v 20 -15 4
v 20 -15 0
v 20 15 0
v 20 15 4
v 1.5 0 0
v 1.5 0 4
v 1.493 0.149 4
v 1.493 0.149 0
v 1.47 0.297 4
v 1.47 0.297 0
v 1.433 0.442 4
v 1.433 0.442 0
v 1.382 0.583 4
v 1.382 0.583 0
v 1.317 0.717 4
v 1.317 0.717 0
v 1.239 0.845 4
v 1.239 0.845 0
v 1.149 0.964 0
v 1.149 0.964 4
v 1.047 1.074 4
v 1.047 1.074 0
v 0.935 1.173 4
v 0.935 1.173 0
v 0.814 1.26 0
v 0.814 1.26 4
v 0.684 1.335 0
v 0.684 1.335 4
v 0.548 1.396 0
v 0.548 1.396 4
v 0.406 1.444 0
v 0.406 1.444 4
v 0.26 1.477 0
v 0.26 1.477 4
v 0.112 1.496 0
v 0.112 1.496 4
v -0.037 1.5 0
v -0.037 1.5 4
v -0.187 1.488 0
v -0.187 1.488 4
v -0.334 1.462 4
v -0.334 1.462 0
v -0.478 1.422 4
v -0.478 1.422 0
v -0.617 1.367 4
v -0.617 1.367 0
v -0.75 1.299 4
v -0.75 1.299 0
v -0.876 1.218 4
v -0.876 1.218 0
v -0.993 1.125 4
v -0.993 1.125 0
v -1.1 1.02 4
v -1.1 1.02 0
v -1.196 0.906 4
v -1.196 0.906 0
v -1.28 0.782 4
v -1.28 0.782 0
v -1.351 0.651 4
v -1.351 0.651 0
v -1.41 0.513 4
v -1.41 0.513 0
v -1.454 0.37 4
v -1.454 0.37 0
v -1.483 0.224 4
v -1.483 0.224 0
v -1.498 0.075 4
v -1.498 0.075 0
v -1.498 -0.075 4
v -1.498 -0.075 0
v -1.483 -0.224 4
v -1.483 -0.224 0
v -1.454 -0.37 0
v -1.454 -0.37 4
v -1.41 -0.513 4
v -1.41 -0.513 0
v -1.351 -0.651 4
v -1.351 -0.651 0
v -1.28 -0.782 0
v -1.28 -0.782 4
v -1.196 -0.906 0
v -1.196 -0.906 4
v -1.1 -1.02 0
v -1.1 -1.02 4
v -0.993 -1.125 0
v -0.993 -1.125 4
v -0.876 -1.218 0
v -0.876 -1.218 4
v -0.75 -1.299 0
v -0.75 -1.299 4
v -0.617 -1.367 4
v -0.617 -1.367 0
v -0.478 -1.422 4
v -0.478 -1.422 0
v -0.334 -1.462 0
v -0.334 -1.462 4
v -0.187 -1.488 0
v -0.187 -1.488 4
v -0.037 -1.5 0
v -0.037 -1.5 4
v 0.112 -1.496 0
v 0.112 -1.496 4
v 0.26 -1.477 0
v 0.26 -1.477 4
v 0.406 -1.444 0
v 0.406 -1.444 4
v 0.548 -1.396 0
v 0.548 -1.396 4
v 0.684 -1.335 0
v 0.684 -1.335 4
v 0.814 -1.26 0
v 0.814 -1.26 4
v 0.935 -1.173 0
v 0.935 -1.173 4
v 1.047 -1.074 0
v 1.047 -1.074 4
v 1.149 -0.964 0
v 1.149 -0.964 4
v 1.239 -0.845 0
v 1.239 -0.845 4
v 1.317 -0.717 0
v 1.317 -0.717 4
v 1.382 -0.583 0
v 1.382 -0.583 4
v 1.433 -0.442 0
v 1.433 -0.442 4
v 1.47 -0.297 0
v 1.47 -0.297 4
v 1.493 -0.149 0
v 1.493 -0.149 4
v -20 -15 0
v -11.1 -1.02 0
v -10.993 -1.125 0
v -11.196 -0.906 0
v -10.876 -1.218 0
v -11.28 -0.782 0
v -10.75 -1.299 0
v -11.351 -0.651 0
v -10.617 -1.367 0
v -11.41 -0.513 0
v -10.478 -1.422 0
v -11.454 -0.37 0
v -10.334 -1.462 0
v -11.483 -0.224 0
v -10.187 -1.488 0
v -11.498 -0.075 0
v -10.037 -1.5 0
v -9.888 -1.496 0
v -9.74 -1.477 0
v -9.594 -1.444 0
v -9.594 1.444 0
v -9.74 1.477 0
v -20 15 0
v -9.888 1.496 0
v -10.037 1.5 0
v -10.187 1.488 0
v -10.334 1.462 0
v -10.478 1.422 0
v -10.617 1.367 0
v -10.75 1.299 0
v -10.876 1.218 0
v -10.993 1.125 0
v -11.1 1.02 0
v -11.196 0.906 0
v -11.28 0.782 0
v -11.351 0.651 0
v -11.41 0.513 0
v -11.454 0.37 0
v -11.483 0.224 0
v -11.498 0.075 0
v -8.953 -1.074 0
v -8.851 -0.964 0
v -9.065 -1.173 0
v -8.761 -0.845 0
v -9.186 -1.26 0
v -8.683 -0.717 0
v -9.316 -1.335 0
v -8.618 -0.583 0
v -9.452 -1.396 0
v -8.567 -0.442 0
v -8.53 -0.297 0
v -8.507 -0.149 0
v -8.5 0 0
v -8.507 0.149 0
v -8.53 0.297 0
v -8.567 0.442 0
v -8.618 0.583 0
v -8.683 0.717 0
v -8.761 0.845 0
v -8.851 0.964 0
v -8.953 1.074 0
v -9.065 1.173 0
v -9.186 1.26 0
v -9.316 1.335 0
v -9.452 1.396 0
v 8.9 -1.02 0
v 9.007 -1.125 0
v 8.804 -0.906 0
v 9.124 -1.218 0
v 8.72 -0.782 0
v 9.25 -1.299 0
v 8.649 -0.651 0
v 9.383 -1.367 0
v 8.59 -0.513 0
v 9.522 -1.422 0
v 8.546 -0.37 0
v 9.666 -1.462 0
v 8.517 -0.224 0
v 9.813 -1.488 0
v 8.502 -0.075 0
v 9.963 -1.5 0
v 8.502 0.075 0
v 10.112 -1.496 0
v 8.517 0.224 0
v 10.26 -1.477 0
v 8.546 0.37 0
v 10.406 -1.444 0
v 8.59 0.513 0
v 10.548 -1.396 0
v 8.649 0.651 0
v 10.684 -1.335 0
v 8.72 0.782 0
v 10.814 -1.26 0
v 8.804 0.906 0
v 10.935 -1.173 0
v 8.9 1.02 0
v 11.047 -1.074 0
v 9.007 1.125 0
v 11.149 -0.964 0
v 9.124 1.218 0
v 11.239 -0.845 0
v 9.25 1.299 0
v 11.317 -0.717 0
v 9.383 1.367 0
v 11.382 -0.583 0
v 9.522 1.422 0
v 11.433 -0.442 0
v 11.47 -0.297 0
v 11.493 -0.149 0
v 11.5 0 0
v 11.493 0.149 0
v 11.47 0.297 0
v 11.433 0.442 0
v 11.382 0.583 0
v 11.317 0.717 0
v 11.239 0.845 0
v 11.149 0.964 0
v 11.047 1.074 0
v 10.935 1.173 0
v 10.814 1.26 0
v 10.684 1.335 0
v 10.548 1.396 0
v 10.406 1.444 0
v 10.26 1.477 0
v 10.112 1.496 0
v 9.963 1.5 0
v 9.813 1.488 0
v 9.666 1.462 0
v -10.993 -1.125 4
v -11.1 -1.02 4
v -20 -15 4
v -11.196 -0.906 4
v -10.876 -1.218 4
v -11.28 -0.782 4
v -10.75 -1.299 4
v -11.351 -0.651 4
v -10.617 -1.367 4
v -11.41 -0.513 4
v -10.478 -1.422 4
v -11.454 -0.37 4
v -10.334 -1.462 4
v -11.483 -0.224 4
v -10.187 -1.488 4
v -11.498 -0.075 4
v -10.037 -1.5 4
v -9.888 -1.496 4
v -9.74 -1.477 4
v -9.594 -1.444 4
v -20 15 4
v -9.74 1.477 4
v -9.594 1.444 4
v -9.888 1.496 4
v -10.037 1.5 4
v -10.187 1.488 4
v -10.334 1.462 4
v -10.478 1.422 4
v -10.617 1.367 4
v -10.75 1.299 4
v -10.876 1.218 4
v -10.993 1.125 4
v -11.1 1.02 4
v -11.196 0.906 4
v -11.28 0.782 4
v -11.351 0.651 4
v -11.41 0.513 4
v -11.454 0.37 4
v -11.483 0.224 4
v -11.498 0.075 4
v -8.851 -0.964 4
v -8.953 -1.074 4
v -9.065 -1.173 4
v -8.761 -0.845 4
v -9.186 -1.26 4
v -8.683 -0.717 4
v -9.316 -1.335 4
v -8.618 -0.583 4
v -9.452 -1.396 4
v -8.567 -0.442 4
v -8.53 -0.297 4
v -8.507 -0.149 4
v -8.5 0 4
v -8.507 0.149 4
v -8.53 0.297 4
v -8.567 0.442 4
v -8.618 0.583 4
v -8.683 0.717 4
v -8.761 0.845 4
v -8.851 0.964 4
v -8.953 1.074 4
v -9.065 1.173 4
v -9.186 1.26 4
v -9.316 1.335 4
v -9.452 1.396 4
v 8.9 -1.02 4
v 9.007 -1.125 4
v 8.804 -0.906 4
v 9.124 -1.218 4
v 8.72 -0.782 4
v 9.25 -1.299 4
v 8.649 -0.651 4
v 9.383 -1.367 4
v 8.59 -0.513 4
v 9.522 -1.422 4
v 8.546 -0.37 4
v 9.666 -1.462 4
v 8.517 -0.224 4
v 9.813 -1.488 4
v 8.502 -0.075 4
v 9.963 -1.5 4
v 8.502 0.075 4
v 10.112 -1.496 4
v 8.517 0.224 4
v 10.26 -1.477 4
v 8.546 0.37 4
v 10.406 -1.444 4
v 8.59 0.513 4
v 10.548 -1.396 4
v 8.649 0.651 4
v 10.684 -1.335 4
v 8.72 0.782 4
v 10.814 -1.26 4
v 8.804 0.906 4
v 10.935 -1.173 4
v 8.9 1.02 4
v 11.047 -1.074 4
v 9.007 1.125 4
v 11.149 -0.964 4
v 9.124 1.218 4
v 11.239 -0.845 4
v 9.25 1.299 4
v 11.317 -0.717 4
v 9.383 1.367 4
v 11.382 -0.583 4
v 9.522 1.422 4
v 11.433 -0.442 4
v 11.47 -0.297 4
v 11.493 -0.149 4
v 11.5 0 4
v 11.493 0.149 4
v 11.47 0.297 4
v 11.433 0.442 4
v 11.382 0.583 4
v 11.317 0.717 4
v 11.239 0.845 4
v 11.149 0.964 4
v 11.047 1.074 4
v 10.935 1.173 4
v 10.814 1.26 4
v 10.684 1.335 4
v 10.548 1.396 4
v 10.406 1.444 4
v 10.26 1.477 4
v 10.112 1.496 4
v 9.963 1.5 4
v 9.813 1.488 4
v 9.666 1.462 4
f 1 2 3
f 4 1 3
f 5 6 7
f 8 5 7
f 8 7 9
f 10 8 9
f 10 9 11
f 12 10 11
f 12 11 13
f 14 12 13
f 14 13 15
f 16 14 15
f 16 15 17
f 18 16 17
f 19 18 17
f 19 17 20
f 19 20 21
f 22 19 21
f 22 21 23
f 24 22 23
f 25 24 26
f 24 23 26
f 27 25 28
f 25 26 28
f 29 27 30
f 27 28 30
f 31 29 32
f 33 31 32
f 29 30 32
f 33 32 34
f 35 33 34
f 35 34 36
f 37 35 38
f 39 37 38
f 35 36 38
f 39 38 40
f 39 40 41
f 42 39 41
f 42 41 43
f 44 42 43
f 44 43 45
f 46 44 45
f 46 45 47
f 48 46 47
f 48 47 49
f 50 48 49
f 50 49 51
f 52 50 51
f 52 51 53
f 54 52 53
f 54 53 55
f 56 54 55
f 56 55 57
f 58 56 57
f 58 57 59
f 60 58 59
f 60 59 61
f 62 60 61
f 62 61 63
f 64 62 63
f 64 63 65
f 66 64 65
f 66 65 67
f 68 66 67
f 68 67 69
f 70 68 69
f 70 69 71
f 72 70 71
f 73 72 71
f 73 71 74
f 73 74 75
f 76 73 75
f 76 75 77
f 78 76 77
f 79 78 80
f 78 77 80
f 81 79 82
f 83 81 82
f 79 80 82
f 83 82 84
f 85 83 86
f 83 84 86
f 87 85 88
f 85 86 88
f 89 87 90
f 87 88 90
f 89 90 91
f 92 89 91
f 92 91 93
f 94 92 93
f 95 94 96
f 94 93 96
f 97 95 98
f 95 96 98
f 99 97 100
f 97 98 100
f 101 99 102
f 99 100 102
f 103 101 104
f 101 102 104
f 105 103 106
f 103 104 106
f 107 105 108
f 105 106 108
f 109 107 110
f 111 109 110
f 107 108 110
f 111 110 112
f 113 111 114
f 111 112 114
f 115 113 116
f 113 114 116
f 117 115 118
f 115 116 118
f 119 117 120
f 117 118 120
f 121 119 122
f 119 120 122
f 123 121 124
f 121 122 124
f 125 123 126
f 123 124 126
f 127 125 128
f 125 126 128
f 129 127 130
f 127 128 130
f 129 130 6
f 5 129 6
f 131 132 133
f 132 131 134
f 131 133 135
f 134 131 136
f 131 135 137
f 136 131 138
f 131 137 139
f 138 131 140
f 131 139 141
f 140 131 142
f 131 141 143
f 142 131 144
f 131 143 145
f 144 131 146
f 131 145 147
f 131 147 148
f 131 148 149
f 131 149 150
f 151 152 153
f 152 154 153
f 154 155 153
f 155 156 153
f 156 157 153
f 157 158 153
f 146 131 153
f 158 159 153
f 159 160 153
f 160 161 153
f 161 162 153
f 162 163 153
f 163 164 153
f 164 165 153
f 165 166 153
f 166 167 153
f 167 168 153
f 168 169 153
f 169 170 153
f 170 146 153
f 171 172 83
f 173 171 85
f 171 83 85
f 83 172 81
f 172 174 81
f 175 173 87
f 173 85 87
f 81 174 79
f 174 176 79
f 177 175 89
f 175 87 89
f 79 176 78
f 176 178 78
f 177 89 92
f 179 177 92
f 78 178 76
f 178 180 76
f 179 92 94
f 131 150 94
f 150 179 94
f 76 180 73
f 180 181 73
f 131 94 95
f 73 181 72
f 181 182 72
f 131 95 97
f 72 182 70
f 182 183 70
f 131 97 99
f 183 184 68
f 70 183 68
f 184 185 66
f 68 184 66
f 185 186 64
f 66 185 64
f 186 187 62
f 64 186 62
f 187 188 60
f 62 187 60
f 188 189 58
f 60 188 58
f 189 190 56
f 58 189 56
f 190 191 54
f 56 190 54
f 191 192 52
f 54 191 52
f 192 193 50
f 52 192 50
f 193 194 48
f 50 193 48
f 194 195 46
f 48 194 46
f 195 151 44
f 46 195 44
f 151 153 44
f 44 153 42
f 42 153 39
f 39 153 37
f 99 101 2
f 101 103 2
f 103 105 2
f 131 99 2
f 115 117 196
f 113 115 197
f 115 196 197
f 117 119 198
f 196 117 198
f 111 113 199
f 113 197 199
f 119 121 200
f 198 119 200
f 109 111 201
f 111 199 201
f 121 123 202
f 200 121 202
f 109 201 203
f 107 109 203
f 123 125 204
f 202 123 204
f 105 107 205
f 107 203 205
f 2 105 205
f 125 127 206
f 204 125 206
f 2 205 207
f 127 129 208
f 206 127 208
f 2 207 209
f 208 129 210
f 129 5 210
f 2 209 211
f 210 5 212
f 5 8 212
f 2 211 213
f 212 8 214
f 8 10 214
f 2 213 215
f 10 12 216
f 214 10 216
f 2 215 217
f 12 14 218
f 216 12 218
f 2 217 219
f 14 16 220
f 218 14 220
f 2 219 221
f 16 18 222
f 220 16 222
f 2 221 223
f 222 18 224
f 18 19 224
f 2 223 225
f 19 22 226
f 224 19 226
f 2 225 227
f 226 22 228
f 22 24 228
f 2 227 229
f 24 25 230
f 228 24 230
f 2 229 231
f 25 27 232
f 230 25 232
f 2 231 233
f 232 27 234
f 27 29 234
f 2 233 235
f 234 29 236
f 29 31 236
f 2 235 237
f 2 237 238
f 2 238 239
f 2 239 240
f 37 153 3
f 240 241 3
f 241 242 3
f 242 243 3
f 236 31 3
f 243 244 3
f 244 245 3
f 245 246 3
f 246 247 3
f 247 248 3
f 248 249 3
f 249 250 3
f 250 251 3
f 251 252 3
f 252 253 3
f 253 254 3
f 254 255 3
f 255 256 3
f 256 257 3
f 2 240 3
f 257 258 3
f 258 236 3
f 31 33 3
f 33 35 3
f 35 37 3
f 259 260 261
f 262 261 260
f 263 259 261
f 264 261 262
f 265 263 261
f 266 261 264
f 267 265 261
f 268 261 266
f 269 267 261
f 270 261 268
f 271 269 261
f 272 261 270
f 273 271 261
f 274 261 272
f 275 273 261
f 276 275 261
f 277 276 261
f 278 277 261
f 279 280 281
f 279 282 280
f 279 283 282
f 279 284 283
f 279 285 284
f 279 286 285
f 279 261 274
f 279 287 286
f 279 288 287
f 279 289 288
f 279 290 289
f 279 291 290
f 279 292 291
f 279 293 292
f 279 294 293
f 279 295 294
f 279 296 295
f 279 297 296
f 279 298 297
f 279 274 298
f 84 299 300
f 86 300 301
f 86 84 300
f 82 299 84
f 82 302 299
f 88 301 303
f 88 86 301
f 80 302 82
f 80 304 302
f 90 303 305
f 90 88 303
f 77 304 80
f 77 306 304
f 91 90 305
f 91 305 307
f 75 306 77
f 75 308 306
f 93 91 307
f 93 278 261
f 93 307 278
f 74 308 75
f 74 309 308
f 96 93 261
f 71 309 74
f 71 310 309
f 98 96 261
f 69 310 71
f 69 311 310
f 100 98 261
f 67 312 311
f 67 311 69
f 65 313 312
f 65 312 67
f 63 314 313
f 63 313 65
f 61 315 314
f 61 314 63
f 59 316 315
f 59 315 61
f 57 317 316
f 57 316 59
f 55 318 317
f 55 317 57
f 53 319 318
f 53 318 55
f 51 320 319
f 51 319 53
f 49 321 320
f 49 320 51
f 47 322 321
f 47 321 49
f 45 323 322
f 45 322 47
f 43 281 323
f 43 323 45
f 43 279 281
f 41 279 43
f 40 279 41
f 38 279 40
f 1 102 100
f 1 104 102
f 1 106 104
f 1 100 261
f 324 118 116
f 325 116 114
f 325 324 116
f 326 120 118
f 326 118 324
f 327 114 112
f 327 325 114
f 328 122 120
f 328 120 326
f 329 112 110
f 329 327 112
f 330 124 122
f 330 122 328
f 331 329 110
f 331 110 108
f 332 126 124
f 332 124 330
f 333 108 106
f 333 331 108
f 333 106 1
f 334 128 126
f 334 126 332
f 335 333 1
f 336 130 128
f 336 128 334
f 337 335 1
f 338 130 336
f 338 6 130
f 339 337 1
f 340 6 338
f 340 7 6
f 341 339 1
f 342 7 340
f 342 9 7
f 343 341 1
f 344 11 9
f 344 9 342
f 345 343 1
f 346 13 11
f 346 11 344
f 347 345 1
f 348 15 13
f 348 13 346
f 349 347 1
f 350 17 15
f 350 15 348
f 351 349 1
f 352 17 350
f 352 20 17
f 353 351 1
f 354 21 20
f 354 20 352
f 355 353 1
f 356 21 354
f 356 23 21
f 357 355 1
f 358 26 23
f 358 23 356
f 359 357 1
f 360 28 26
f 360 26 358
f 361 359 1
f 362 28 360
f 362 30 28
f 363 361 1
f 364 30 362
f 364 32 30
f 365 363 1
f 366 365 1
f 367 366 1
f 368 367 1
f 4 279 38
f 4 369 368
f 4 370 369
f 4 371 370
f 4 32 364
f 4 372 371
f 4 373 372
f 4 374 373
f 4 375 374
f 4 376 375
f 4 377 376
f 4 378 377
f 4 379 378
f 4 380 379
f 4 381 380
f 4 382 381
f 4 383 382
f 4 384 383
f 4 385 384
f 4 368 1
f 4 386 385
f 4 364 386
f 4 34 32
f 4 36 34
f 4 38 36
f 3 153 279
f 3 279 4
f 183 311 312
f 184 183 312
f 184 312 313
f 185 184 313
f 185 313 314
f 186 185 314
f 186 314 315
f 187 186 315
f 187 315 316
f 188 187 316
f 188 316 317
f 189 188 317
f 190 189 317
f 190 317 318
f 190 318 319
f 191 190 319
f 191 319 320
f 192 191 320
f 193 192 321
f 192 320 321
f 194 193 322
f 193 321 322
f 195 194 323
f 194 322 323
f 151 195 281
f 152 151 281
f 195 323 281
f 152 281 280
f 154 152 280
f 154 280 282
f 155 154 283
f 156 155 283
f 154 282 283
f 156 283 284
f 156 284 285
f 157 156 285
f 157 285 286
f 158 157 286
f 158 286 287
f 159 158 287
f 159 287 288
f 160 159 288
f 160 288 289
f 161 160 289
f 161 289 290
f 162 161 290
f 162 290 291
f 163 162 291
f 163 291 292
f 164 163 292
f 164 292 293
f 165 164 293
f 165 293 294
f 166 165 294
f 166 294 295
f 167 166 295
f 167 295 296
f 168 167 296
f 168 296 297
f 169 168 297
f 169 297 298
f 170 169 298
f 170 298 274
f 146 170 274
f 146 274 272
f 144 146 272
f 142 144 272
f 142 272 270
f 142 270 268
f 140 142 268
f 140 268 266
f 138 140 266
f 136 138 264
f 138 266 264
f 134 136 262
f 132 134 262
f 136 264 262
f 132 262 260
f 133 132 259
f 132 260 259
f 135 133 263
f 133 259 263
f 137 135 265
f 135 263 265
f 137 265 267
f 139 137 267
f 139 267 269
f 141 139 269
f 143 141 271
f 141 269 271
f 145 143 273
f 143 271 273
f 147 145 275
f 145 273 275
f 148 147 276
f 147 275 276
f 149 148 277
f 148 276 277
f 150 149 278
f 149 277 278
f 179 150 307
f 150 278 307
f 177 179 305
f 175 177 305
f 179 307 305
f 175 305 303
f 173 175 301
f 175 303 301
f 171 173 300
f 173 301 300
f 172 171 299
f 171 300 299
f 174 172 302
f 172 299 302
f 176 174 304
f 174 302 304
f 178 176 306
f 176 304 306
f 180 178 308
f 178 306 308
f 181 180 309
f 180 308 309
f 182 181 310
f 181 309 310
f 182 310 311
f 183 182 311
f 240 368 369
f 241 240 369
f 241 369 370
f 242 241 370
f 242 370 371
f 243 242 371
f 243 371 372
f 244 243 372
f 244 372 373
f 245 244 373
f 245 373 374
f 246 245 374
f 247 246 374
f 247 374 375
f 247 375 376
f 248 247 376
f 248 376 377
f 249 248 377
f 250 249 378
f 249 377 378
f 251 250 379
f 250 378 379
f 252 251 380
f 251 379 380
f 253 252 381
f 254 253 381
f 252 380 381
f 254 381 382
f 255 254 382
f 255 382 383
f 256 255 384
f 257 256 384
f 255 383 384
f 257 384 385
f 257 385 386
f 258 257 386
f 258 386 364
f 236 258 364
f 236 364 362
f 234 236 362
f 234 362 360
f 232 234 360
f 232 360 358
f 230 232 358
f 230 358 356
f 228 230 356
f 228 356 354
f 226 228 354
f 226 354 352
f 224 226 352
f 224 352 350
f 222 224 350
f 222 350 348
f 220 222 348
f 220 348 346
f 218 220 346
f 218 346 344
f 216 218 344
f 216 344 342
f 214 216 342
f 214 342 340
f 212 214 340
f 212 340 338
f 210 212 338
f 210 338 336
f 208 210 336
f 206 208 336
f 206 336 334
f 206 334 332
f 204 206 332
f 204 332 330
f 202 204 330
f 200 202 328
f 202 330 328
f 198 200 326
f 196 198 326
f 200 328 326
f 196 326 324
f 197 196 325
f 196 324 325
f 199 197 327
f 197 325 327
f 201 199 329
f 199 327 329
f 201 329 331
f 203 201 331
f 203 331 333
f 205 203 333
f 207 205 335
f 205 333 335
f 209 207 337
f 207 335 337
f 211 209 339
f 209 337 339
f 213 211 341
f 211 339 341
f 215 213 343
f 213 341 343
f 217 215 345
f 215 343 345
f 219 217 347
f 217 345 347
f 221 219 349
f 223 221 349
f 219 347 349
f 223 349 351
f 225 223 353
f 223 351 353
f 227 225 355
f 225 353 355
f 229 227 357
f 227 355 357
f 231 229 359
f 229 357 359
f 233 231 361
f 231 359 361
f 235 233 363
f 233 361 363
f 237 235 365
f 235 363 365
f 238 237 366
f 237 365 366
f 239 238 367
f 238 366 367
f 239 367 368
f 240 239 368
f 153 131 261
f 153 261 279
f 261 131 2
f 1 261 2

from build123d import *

# Parameters (mm, degrees)
ESBO_O1_W                = 40
ESBO_O1_H                = 30
RESSALTO_EXTRUS_O1_DEPTH = 4
CORTE_EXTRUS_O1_REACH    = 27.318
ESBO_O2_R                = 1.5


with BuildPart() as part:
    # Esboço1 → Ressalto-extrusão1 (new body)
    with BuildSketch(Plane.XY):
        Rectangle(ESBO_O1_W, ESBO_O1_H)
    extrude(amount=RESSALTO_EXTRUS_O1_DEPTH)

    # Esboço2 → Corte-extrusão1 (cut, up to next)
    with BuildSketch(Plane.XY.offset(4), mode=Mode.PRIVATE) as corte_extrus_o1_sk1:
        Circle(ESBO_O2_R)
    corte_extrus_o1_tool1 = extrude(corte_extrus_o1_sk1.sketch, amount=-CORTE_EXTRUS_O1_REACH, mode=Mode.PRIVATE) & part.part
    # Esboço2 → Corte-extrusão1 (cut, up to next)
    with BuildSketch(Plane.XY.offset(4), mode=Mode.PRIVATE) as corte_extrus_o1_sk2:
        with Locations((-10, 0)):
            Circle(ESBO_O2_R)
    corte_extrus_o1_tool2 = extrude(corte_extrus_o1_sk2.sketch, amount=-CORTE_EXTRUS_O1_REACH, mode=Mode.PRIVATE) & part.part
    # Esboço2 → Corte-extrusão1 (cut, up to next)
    with BuildSketch(Plane.XY.offset(4), mode=Mode.PRIVATE) as corte_extrus_o1_sk3:
        with Locations((10, 0)):
            Circle(ESBO_O2_R)
    corte_extrus_o1_tool3 = extrude(corte_extrus_o1_sk3.sketch, amount=-CORTE_EXTRUS_O1_REACH, mode=Mode.PRIVATE) & part.part
    add(corte_extrus_o1_tool1.solids().sort_by_distance((0, 0, 4))[0], mode=Mode.SUBTRACT)
    add(corte_extrus_o1_tool2.solids().sort_by_distance((-10, 0, 4))[0], mode=Mode.SUBTRACT)
    add(corte_extrus_o1_tool3.solids().sort_by_distance((10, 0, 4))[0], mode=Mode.SUBTRACT)


solid = part.part
